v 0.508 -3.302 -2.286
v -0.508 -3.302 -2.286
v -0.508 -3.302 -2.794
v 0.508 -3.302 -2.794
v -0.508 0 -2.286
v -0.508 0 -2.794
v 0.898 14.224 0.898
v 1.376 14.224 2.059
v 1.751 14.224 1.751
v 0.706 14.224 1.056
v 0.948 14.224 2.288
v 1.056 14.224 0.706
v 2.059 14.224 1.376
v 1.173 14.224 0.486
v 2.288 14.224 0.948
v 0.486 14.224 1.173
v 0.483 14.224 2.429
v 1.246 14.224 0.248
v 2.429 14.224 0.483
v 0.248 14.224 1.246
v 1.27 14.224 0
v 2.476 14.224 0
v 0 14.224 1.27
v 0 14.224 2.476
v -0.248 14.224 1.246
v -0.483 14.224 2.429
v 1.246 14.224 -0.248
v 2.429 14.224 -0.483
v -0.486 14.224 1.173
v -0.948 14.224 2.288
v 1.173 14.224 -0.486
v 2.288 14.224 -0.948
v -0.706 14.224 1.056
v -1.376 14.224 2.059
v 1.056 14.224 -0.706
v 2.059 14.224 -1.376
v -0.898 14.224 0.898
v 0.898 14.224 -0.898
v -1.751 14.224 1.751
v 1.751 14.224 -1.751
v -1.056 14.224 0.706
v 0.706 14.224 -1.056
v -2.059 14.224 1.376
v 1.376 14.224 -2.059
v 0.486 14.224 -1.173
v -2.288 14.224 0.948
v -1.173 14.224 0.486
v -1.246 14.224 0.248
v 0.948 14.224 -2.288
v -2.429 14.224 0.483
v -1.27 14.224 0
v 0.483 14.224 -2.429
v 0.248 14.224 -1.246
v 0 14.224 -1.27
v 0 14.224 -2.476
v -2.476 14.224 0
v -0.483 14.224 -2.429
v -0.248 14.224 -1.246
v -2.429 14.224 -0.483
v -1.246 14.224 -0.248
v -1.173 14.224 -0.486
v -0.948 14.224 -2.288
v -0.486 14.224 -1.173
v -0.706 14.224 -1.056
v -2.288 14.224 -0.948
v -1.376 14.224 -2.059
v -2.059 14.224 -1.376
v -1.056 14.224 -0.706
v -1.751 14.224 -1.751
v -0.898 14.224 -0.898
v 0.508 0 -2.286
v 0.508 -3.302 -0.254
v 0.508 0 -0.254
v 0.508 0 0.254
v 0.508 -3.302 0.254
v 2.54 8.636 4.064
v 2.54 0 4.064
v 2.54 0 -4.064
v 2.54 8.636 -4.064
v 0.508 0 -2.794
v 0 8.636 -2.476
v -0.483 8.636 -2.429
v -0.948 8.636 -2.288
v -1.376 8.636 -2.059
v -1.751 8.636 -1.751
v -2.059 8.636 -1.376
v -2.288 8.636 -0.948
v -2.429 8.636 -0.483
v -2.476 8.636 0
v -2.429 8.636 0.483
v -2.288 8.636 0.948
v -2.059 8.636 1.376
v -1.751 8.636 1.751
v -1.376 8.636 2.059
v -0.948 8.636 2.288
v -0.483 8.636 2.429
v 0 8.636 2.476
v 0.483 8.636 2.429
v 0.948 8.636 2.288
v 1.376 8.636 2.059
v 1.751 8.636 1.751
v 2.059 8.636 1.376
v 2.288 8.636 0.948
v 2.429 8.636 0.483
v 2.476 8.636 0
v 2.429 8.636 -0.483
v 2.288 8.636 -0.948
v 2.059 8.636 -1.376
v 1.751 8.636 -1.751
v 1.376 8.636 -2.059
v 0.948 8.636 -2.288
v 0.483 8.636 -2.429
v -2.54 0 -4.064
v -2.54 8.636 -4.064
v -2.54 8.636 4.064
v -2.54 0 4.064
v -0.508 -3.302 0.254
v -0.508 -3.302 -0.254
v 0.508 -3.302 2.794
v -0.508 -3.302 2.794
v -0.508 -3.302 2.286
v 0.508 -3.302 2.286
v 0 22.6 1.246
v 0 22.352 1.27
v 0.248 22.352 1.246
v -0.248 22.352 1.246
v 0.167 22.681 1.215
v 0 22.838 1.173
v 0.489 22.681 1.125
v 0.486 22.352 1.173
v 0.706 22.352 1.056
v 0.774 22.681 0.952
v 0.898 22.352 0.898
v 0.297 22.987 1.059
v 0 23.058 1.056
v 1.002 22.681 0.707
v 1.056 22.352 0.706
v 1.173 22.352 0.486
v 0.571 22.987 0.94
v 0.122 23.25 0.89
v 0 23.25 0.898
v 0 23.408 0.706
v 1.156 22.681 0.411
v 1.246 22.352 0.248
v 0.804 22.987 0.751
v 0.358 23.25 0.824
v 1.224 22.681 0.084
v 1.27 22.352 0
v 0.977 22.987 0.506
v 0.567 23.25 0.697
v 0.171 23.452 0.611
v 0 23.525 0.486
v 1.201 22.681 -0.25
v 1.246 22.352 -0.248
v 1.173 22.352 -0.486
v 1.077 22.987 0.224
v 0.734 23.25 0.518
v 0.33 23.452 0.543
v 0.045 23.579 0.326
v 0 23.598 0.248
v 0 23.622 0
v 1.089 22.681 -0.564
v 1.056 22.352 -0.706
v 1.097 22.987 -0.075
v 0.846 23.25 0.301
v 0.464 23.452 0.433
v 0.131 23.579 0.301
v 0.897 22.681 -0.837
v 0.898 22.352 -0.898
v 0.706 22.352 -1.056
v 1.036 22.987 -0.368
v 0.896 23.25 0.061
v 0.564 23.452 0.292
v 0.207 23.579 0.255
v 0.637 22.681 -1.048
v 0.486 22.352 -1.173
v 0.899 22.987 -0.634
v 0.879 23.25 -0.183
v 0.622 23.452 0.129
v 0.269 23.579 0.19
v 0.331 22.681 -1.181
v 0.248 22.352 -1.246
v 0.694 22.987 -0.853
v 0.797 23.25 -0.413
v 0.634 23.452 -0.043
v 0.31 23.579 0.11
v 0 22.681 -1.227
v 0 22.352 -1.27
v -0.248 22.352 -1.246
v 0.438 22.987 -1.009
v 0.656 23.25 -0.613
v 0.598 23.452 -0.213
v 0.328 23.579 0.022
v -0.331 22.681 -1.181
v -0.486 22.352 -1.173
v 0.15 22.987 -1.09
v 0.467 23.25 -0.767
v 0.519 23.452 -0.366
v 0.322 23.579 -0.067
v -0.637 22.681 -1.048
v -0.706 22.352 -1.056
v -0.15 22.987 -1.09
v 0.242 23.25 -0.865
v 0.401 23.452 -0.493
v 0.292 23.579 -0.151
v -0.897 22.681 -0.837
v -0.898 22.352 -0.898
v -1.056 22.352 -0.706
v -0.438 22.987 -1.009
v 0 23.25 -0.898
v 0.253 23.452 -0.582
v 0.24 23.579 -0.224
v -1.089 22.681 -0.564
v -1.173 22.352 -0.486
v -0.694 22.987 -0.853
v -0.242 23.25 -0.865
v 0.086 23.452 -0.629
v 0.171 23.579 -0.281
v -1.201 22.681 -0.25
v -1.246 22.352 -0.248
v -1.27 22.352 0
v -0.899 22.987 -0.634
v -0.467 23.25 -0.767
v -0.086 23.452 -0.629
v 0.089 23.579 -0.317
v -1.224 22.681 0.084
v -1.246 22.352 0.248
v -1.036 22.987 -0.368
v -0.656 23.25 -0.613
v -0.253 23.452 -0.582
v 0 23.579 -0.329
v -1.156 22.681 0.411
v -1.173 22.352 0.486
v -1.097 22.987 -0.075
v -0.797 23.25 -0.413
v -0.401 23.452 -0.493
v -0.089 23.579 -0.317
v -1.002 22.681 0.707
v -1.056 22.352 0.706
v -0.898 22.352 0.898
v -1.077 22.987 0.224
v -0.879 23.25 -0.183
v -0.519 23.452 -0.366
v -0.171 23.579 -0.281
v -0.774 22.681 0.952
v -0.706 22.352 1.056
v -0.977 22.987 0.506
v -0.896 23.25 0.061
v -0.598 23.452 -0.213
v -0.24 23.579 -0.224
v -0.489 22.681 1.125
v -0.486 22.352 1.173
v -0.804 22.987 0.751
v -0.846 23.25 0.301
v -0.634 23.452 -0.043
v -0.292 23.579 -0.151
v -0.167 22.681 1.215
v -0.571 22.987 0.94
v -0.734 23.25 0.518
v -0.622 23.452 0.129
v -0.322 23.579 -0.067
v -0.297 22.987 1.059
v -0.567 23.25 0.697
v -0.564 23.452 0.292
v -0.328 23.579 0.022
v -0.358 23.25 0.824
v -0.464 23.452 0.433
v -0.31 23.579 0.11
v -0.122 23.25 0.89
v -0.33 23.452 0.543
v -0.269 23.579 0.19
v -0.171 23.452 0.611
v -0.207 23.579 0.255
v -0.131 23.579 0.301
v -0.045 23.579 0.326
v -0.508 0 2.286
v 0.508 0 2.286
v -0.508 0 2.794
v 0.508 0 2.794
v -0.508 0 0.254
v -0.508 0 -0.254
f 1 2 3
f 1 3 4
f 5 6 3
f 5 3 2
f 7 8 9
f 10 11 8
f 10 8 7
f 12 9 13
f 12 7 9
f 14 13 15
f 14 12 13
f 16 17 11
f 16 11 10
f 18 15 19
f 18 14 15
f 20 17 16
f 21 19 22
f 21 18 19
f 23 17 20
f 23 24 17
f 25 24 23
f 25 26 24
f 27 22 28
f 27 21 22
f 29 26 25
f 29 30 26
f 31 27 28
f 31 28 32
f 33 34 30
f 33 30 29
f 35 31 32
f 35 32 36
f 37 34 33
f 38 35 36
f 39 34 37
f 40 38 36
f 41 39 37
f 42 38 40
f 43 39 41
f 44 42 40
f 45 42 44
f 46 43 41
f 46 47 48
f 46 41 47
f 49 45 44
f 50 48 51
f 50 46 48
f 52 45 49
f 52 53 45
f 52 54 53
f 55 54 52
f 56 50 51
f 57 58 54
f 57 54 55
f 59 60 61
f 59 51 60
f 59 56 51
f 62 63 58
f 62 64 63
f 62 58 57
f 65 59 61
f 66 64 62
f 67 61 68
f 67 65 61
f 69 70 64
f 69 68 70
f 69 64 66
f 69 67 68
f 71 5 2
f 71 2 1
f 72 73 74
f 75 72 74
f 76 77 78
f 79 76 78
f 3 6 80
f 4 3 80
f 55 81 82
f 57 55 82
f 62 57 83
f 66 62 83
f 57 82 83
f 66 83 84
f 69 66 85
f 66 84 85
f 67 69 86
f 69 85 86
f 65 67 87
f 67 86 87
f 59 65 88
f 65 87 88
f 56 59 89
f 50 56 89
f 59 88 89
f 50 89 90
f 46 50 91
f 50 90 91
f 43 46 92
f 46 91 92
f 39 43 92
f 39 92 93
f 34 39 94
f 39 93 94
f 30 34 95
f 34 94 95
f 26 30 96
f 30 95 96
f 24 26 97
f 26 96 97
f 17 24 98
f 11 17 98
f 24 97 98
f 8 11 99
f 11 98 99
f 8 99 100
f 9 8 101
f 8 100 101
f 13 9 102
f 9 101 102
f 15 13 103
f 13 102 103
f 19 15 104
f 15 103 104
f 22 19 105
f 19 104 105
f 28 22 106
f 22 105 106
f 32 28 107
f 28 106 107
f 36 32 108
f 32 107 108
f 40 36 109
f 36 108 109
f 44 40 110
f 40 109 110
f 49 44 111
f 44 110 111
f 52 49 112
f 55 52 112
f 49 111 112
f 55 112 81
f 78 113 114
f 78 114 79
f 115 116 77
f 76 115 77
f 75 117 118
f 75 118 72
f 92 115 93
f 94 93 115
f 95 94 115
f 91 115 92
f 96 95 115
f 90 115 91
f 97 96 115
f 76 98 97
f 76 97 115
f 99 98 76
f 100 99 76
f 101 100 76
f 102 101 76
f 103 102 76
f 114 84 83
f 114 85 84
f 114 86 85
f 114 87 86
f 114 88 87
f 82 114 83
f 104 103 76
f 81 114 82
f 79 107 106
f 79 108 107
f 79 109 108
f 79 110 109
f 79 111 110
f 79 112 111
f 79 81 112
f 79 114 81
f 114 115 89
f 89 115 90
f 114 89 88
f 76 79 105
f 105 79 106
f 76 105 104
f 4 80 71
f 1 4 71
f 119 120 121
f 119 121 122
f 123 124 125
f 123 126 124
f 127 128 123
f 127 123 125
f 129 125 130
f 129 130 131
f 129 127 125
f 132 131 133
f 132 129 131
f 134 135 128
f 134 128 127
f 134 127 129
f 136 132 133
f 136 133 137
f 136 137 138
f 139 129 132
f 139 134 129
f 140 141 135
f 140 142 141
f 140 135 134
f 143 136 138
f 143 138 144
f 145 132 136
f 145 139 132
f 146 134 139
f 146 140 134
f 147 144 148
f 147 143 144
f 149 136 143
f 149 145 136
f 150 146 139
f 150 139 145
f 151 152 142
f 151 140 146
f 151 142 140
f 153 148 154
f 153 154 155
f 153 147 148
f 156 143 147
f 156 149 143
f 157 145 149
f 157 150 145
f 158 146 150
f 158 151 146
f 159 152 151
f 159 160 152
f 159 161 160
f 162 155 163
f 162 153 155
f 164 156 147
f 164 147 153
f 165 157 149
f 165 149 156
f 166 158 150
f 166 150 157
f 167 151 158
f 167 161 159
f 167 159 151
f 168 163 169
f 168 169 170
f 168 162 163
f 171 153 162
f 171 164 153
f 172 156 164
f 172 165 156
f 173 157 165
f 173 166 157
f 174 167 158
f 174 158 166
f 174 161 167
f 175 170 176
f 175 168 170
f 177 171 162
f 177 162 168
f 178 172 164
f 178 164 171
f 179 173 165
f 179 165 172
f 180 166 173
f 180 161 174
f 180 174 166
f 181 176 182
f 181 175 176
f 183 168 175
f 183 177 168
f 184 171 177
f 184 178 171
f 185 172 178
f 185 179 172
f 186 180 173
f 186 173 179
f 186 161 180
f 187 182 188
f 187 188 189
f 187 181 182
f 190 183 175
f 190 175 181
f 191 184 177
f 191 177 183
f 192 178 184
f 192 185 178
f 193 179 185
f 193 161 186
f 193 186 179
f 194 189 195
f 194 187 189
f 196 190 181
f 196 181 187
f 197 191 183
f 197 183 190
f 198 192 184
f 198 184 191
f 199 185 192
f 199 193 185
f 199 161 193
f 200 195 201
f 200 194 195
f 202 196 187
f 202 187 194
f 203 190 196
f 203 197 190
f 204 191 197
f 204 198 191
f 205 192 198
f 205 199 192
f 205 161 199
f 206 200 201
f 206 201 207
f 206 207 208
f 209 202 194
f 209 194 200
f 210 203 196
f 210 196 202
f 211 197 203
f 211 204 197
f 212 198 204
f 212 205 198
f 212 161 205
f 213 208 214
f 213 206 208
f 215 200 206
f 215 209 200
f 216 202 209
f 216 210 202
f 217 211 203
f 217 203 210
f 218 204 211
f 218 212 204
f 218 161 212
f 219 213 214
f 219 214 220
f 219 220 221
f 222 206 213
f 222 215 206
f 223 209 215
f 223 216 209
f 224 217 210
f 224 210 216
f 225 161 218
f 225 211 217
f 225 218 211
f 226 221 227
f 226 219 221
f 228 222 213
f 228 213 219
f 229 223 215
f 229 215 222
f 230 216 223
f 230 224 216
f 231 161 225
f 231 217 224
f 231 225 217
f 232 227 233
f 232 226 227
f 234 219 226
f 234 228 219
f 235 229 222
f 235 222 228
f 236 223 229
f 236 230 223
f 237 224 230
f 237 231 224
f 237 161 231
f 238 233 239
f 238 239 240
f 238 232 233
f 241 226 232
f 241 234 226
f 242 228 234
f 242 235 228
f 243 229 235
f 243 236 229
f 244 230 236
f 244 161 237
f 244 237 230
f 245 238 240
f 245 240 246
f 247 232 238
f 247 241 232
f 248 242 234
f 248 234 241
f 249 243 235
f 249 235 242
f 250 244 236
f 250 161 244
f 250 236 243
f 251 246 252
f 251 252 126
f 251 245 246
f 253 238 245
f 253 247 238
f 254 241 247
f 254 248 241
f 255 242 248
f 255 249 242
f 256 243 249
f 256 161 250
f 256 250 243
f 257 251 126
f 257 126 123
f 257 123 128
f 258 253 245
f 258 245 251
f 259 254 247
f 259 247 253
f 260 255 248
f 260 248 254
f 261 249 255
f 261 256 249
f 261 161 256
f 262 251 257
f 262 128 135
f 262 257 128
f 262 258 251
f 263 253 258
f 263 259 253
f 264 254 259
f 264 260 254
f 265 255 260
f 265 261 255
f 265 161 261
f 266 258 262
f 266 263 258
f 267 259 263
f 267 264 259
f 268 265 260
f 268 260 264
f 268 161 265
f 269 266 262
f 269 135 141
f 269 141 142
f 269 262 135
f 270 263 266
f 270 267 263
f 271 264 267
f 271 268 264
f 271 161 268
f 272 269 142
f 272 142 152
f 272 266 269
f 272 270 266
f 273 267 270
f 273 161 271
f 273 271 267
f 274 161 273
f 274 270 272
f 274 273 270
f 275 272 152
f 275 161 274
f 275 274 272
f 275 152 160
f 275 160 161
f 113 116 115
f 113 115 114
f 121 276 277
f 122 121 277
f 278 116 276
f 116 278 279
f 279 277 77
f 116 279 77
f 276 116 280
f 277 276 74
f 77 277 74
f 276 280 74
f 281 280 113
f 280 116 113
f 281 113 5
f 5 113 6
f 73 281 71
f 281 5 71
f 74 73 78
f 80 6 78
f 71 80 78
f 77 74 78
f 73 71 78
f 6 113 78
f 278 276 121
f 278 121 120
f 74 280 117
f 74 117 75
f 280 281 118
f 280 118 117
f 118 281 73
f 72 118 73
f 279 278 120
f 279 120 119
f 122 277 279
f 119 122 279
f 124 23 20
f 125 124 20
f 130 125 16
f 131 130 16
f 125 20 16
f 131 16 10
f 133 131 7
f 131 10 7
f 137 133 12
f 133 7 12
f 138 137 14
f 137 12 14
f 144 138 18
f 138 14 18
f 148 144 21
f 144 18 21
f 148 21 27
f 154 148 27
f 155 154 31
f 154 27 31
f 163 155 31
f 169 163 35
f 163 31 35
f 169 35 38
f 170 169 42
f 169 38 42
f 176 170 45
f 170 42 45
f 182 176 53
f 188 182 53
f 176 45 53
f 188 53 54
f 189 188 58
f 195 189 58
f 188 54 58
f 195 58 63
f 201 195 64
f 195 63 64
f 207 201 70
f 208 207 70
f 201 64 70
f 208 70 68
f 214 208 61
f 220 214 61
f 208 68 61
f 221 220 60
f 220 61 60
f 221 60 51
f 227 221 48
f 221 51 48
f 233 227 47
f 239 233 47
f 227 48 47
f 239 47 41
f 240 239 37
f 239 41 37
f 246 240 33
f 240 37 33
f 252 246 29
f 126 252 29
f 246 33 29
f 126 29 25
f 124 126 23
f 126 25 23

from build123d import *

# Parameters (mm, degrees)
SKETCH1_W           = 5.08
SKETCH1_H           = 8.128
BOSS_EXTRUDE1_DEPTH = 8.636
SKETCH2_R           = 2.4765
BOSS_EXTRUDE2_DEPTH = 5.588
SKETCH3_W           = 1.016
SKETCH3_H           = 0.508
BOSS_EXTRUDE3_DEPTH = 3.302
SKETCH4_R           = 1.27
BOSS_EXTRUDE4_DEPTH = 9.398
FILLET1_R           = 1.27


with BuildPart() as part:
    # Sketch1 → Boss-Extrude1 (new body)
    with BuildSketch(Plane(origin=(0, 0, 0), x_dir=(1, 0, 0), z_dir=(0, 1, 0))):
        Rectangle(SKETCH1_W, SKETCH1_H)
    extrude(amount=BOSS_EXTRUDE1_DEPTH)

    # Sketch2 → Boss-Extrude2 (add)
    with BuildSketch(Plane(origin=(0, 8.636, 0), x_dir=(1, 0, 0), z_dir=(0, 1, 0))):
        with Locations(Location((0, 0, 0), (0, 0, 90))):
            Circle(SKETCH2_R)
    extrude(amount=BOSS_EXTRUDE2_DEPTH)

    # Sketch3 → Boss-Extrude3 (add)
    with BuildSketch(Plane.XZ):
        Rectangle(SKETCH3_W, SKETCH3_H)
        with Locations((0, -2.54)):
            Rectangle(SKETCH3_W, SKETCH3_H)
        with Locations((0, 2.54)):
            Rectangle(SKETCH3_W, SKETCH3_H)
    extrude(amount=BOSS_EXTRUDE3_DEPTH)

    # Sketch4 → Boss-Extrude4 (add)
    with BuildSketch(Plane(origin=(0, 14.224, 0), x_dir=(1, 0, 0), z_dir=(0, 1, 0))):
        with Locations(Location((0, 0, 0), (0, 0, 270))):
            Circle(SKETCH4_R)
    extrude(amount=BOSS_EXTRUDE4_DEPTH)

    # Fillet1
    fillet1_edges = [part.edges().sort_by_distance(p)[0] for p in [
        (0, 23.622, -1.27),
    ]]
    fillet(fillet1_edges, radius=FILLET1_R)


solid = part.part
